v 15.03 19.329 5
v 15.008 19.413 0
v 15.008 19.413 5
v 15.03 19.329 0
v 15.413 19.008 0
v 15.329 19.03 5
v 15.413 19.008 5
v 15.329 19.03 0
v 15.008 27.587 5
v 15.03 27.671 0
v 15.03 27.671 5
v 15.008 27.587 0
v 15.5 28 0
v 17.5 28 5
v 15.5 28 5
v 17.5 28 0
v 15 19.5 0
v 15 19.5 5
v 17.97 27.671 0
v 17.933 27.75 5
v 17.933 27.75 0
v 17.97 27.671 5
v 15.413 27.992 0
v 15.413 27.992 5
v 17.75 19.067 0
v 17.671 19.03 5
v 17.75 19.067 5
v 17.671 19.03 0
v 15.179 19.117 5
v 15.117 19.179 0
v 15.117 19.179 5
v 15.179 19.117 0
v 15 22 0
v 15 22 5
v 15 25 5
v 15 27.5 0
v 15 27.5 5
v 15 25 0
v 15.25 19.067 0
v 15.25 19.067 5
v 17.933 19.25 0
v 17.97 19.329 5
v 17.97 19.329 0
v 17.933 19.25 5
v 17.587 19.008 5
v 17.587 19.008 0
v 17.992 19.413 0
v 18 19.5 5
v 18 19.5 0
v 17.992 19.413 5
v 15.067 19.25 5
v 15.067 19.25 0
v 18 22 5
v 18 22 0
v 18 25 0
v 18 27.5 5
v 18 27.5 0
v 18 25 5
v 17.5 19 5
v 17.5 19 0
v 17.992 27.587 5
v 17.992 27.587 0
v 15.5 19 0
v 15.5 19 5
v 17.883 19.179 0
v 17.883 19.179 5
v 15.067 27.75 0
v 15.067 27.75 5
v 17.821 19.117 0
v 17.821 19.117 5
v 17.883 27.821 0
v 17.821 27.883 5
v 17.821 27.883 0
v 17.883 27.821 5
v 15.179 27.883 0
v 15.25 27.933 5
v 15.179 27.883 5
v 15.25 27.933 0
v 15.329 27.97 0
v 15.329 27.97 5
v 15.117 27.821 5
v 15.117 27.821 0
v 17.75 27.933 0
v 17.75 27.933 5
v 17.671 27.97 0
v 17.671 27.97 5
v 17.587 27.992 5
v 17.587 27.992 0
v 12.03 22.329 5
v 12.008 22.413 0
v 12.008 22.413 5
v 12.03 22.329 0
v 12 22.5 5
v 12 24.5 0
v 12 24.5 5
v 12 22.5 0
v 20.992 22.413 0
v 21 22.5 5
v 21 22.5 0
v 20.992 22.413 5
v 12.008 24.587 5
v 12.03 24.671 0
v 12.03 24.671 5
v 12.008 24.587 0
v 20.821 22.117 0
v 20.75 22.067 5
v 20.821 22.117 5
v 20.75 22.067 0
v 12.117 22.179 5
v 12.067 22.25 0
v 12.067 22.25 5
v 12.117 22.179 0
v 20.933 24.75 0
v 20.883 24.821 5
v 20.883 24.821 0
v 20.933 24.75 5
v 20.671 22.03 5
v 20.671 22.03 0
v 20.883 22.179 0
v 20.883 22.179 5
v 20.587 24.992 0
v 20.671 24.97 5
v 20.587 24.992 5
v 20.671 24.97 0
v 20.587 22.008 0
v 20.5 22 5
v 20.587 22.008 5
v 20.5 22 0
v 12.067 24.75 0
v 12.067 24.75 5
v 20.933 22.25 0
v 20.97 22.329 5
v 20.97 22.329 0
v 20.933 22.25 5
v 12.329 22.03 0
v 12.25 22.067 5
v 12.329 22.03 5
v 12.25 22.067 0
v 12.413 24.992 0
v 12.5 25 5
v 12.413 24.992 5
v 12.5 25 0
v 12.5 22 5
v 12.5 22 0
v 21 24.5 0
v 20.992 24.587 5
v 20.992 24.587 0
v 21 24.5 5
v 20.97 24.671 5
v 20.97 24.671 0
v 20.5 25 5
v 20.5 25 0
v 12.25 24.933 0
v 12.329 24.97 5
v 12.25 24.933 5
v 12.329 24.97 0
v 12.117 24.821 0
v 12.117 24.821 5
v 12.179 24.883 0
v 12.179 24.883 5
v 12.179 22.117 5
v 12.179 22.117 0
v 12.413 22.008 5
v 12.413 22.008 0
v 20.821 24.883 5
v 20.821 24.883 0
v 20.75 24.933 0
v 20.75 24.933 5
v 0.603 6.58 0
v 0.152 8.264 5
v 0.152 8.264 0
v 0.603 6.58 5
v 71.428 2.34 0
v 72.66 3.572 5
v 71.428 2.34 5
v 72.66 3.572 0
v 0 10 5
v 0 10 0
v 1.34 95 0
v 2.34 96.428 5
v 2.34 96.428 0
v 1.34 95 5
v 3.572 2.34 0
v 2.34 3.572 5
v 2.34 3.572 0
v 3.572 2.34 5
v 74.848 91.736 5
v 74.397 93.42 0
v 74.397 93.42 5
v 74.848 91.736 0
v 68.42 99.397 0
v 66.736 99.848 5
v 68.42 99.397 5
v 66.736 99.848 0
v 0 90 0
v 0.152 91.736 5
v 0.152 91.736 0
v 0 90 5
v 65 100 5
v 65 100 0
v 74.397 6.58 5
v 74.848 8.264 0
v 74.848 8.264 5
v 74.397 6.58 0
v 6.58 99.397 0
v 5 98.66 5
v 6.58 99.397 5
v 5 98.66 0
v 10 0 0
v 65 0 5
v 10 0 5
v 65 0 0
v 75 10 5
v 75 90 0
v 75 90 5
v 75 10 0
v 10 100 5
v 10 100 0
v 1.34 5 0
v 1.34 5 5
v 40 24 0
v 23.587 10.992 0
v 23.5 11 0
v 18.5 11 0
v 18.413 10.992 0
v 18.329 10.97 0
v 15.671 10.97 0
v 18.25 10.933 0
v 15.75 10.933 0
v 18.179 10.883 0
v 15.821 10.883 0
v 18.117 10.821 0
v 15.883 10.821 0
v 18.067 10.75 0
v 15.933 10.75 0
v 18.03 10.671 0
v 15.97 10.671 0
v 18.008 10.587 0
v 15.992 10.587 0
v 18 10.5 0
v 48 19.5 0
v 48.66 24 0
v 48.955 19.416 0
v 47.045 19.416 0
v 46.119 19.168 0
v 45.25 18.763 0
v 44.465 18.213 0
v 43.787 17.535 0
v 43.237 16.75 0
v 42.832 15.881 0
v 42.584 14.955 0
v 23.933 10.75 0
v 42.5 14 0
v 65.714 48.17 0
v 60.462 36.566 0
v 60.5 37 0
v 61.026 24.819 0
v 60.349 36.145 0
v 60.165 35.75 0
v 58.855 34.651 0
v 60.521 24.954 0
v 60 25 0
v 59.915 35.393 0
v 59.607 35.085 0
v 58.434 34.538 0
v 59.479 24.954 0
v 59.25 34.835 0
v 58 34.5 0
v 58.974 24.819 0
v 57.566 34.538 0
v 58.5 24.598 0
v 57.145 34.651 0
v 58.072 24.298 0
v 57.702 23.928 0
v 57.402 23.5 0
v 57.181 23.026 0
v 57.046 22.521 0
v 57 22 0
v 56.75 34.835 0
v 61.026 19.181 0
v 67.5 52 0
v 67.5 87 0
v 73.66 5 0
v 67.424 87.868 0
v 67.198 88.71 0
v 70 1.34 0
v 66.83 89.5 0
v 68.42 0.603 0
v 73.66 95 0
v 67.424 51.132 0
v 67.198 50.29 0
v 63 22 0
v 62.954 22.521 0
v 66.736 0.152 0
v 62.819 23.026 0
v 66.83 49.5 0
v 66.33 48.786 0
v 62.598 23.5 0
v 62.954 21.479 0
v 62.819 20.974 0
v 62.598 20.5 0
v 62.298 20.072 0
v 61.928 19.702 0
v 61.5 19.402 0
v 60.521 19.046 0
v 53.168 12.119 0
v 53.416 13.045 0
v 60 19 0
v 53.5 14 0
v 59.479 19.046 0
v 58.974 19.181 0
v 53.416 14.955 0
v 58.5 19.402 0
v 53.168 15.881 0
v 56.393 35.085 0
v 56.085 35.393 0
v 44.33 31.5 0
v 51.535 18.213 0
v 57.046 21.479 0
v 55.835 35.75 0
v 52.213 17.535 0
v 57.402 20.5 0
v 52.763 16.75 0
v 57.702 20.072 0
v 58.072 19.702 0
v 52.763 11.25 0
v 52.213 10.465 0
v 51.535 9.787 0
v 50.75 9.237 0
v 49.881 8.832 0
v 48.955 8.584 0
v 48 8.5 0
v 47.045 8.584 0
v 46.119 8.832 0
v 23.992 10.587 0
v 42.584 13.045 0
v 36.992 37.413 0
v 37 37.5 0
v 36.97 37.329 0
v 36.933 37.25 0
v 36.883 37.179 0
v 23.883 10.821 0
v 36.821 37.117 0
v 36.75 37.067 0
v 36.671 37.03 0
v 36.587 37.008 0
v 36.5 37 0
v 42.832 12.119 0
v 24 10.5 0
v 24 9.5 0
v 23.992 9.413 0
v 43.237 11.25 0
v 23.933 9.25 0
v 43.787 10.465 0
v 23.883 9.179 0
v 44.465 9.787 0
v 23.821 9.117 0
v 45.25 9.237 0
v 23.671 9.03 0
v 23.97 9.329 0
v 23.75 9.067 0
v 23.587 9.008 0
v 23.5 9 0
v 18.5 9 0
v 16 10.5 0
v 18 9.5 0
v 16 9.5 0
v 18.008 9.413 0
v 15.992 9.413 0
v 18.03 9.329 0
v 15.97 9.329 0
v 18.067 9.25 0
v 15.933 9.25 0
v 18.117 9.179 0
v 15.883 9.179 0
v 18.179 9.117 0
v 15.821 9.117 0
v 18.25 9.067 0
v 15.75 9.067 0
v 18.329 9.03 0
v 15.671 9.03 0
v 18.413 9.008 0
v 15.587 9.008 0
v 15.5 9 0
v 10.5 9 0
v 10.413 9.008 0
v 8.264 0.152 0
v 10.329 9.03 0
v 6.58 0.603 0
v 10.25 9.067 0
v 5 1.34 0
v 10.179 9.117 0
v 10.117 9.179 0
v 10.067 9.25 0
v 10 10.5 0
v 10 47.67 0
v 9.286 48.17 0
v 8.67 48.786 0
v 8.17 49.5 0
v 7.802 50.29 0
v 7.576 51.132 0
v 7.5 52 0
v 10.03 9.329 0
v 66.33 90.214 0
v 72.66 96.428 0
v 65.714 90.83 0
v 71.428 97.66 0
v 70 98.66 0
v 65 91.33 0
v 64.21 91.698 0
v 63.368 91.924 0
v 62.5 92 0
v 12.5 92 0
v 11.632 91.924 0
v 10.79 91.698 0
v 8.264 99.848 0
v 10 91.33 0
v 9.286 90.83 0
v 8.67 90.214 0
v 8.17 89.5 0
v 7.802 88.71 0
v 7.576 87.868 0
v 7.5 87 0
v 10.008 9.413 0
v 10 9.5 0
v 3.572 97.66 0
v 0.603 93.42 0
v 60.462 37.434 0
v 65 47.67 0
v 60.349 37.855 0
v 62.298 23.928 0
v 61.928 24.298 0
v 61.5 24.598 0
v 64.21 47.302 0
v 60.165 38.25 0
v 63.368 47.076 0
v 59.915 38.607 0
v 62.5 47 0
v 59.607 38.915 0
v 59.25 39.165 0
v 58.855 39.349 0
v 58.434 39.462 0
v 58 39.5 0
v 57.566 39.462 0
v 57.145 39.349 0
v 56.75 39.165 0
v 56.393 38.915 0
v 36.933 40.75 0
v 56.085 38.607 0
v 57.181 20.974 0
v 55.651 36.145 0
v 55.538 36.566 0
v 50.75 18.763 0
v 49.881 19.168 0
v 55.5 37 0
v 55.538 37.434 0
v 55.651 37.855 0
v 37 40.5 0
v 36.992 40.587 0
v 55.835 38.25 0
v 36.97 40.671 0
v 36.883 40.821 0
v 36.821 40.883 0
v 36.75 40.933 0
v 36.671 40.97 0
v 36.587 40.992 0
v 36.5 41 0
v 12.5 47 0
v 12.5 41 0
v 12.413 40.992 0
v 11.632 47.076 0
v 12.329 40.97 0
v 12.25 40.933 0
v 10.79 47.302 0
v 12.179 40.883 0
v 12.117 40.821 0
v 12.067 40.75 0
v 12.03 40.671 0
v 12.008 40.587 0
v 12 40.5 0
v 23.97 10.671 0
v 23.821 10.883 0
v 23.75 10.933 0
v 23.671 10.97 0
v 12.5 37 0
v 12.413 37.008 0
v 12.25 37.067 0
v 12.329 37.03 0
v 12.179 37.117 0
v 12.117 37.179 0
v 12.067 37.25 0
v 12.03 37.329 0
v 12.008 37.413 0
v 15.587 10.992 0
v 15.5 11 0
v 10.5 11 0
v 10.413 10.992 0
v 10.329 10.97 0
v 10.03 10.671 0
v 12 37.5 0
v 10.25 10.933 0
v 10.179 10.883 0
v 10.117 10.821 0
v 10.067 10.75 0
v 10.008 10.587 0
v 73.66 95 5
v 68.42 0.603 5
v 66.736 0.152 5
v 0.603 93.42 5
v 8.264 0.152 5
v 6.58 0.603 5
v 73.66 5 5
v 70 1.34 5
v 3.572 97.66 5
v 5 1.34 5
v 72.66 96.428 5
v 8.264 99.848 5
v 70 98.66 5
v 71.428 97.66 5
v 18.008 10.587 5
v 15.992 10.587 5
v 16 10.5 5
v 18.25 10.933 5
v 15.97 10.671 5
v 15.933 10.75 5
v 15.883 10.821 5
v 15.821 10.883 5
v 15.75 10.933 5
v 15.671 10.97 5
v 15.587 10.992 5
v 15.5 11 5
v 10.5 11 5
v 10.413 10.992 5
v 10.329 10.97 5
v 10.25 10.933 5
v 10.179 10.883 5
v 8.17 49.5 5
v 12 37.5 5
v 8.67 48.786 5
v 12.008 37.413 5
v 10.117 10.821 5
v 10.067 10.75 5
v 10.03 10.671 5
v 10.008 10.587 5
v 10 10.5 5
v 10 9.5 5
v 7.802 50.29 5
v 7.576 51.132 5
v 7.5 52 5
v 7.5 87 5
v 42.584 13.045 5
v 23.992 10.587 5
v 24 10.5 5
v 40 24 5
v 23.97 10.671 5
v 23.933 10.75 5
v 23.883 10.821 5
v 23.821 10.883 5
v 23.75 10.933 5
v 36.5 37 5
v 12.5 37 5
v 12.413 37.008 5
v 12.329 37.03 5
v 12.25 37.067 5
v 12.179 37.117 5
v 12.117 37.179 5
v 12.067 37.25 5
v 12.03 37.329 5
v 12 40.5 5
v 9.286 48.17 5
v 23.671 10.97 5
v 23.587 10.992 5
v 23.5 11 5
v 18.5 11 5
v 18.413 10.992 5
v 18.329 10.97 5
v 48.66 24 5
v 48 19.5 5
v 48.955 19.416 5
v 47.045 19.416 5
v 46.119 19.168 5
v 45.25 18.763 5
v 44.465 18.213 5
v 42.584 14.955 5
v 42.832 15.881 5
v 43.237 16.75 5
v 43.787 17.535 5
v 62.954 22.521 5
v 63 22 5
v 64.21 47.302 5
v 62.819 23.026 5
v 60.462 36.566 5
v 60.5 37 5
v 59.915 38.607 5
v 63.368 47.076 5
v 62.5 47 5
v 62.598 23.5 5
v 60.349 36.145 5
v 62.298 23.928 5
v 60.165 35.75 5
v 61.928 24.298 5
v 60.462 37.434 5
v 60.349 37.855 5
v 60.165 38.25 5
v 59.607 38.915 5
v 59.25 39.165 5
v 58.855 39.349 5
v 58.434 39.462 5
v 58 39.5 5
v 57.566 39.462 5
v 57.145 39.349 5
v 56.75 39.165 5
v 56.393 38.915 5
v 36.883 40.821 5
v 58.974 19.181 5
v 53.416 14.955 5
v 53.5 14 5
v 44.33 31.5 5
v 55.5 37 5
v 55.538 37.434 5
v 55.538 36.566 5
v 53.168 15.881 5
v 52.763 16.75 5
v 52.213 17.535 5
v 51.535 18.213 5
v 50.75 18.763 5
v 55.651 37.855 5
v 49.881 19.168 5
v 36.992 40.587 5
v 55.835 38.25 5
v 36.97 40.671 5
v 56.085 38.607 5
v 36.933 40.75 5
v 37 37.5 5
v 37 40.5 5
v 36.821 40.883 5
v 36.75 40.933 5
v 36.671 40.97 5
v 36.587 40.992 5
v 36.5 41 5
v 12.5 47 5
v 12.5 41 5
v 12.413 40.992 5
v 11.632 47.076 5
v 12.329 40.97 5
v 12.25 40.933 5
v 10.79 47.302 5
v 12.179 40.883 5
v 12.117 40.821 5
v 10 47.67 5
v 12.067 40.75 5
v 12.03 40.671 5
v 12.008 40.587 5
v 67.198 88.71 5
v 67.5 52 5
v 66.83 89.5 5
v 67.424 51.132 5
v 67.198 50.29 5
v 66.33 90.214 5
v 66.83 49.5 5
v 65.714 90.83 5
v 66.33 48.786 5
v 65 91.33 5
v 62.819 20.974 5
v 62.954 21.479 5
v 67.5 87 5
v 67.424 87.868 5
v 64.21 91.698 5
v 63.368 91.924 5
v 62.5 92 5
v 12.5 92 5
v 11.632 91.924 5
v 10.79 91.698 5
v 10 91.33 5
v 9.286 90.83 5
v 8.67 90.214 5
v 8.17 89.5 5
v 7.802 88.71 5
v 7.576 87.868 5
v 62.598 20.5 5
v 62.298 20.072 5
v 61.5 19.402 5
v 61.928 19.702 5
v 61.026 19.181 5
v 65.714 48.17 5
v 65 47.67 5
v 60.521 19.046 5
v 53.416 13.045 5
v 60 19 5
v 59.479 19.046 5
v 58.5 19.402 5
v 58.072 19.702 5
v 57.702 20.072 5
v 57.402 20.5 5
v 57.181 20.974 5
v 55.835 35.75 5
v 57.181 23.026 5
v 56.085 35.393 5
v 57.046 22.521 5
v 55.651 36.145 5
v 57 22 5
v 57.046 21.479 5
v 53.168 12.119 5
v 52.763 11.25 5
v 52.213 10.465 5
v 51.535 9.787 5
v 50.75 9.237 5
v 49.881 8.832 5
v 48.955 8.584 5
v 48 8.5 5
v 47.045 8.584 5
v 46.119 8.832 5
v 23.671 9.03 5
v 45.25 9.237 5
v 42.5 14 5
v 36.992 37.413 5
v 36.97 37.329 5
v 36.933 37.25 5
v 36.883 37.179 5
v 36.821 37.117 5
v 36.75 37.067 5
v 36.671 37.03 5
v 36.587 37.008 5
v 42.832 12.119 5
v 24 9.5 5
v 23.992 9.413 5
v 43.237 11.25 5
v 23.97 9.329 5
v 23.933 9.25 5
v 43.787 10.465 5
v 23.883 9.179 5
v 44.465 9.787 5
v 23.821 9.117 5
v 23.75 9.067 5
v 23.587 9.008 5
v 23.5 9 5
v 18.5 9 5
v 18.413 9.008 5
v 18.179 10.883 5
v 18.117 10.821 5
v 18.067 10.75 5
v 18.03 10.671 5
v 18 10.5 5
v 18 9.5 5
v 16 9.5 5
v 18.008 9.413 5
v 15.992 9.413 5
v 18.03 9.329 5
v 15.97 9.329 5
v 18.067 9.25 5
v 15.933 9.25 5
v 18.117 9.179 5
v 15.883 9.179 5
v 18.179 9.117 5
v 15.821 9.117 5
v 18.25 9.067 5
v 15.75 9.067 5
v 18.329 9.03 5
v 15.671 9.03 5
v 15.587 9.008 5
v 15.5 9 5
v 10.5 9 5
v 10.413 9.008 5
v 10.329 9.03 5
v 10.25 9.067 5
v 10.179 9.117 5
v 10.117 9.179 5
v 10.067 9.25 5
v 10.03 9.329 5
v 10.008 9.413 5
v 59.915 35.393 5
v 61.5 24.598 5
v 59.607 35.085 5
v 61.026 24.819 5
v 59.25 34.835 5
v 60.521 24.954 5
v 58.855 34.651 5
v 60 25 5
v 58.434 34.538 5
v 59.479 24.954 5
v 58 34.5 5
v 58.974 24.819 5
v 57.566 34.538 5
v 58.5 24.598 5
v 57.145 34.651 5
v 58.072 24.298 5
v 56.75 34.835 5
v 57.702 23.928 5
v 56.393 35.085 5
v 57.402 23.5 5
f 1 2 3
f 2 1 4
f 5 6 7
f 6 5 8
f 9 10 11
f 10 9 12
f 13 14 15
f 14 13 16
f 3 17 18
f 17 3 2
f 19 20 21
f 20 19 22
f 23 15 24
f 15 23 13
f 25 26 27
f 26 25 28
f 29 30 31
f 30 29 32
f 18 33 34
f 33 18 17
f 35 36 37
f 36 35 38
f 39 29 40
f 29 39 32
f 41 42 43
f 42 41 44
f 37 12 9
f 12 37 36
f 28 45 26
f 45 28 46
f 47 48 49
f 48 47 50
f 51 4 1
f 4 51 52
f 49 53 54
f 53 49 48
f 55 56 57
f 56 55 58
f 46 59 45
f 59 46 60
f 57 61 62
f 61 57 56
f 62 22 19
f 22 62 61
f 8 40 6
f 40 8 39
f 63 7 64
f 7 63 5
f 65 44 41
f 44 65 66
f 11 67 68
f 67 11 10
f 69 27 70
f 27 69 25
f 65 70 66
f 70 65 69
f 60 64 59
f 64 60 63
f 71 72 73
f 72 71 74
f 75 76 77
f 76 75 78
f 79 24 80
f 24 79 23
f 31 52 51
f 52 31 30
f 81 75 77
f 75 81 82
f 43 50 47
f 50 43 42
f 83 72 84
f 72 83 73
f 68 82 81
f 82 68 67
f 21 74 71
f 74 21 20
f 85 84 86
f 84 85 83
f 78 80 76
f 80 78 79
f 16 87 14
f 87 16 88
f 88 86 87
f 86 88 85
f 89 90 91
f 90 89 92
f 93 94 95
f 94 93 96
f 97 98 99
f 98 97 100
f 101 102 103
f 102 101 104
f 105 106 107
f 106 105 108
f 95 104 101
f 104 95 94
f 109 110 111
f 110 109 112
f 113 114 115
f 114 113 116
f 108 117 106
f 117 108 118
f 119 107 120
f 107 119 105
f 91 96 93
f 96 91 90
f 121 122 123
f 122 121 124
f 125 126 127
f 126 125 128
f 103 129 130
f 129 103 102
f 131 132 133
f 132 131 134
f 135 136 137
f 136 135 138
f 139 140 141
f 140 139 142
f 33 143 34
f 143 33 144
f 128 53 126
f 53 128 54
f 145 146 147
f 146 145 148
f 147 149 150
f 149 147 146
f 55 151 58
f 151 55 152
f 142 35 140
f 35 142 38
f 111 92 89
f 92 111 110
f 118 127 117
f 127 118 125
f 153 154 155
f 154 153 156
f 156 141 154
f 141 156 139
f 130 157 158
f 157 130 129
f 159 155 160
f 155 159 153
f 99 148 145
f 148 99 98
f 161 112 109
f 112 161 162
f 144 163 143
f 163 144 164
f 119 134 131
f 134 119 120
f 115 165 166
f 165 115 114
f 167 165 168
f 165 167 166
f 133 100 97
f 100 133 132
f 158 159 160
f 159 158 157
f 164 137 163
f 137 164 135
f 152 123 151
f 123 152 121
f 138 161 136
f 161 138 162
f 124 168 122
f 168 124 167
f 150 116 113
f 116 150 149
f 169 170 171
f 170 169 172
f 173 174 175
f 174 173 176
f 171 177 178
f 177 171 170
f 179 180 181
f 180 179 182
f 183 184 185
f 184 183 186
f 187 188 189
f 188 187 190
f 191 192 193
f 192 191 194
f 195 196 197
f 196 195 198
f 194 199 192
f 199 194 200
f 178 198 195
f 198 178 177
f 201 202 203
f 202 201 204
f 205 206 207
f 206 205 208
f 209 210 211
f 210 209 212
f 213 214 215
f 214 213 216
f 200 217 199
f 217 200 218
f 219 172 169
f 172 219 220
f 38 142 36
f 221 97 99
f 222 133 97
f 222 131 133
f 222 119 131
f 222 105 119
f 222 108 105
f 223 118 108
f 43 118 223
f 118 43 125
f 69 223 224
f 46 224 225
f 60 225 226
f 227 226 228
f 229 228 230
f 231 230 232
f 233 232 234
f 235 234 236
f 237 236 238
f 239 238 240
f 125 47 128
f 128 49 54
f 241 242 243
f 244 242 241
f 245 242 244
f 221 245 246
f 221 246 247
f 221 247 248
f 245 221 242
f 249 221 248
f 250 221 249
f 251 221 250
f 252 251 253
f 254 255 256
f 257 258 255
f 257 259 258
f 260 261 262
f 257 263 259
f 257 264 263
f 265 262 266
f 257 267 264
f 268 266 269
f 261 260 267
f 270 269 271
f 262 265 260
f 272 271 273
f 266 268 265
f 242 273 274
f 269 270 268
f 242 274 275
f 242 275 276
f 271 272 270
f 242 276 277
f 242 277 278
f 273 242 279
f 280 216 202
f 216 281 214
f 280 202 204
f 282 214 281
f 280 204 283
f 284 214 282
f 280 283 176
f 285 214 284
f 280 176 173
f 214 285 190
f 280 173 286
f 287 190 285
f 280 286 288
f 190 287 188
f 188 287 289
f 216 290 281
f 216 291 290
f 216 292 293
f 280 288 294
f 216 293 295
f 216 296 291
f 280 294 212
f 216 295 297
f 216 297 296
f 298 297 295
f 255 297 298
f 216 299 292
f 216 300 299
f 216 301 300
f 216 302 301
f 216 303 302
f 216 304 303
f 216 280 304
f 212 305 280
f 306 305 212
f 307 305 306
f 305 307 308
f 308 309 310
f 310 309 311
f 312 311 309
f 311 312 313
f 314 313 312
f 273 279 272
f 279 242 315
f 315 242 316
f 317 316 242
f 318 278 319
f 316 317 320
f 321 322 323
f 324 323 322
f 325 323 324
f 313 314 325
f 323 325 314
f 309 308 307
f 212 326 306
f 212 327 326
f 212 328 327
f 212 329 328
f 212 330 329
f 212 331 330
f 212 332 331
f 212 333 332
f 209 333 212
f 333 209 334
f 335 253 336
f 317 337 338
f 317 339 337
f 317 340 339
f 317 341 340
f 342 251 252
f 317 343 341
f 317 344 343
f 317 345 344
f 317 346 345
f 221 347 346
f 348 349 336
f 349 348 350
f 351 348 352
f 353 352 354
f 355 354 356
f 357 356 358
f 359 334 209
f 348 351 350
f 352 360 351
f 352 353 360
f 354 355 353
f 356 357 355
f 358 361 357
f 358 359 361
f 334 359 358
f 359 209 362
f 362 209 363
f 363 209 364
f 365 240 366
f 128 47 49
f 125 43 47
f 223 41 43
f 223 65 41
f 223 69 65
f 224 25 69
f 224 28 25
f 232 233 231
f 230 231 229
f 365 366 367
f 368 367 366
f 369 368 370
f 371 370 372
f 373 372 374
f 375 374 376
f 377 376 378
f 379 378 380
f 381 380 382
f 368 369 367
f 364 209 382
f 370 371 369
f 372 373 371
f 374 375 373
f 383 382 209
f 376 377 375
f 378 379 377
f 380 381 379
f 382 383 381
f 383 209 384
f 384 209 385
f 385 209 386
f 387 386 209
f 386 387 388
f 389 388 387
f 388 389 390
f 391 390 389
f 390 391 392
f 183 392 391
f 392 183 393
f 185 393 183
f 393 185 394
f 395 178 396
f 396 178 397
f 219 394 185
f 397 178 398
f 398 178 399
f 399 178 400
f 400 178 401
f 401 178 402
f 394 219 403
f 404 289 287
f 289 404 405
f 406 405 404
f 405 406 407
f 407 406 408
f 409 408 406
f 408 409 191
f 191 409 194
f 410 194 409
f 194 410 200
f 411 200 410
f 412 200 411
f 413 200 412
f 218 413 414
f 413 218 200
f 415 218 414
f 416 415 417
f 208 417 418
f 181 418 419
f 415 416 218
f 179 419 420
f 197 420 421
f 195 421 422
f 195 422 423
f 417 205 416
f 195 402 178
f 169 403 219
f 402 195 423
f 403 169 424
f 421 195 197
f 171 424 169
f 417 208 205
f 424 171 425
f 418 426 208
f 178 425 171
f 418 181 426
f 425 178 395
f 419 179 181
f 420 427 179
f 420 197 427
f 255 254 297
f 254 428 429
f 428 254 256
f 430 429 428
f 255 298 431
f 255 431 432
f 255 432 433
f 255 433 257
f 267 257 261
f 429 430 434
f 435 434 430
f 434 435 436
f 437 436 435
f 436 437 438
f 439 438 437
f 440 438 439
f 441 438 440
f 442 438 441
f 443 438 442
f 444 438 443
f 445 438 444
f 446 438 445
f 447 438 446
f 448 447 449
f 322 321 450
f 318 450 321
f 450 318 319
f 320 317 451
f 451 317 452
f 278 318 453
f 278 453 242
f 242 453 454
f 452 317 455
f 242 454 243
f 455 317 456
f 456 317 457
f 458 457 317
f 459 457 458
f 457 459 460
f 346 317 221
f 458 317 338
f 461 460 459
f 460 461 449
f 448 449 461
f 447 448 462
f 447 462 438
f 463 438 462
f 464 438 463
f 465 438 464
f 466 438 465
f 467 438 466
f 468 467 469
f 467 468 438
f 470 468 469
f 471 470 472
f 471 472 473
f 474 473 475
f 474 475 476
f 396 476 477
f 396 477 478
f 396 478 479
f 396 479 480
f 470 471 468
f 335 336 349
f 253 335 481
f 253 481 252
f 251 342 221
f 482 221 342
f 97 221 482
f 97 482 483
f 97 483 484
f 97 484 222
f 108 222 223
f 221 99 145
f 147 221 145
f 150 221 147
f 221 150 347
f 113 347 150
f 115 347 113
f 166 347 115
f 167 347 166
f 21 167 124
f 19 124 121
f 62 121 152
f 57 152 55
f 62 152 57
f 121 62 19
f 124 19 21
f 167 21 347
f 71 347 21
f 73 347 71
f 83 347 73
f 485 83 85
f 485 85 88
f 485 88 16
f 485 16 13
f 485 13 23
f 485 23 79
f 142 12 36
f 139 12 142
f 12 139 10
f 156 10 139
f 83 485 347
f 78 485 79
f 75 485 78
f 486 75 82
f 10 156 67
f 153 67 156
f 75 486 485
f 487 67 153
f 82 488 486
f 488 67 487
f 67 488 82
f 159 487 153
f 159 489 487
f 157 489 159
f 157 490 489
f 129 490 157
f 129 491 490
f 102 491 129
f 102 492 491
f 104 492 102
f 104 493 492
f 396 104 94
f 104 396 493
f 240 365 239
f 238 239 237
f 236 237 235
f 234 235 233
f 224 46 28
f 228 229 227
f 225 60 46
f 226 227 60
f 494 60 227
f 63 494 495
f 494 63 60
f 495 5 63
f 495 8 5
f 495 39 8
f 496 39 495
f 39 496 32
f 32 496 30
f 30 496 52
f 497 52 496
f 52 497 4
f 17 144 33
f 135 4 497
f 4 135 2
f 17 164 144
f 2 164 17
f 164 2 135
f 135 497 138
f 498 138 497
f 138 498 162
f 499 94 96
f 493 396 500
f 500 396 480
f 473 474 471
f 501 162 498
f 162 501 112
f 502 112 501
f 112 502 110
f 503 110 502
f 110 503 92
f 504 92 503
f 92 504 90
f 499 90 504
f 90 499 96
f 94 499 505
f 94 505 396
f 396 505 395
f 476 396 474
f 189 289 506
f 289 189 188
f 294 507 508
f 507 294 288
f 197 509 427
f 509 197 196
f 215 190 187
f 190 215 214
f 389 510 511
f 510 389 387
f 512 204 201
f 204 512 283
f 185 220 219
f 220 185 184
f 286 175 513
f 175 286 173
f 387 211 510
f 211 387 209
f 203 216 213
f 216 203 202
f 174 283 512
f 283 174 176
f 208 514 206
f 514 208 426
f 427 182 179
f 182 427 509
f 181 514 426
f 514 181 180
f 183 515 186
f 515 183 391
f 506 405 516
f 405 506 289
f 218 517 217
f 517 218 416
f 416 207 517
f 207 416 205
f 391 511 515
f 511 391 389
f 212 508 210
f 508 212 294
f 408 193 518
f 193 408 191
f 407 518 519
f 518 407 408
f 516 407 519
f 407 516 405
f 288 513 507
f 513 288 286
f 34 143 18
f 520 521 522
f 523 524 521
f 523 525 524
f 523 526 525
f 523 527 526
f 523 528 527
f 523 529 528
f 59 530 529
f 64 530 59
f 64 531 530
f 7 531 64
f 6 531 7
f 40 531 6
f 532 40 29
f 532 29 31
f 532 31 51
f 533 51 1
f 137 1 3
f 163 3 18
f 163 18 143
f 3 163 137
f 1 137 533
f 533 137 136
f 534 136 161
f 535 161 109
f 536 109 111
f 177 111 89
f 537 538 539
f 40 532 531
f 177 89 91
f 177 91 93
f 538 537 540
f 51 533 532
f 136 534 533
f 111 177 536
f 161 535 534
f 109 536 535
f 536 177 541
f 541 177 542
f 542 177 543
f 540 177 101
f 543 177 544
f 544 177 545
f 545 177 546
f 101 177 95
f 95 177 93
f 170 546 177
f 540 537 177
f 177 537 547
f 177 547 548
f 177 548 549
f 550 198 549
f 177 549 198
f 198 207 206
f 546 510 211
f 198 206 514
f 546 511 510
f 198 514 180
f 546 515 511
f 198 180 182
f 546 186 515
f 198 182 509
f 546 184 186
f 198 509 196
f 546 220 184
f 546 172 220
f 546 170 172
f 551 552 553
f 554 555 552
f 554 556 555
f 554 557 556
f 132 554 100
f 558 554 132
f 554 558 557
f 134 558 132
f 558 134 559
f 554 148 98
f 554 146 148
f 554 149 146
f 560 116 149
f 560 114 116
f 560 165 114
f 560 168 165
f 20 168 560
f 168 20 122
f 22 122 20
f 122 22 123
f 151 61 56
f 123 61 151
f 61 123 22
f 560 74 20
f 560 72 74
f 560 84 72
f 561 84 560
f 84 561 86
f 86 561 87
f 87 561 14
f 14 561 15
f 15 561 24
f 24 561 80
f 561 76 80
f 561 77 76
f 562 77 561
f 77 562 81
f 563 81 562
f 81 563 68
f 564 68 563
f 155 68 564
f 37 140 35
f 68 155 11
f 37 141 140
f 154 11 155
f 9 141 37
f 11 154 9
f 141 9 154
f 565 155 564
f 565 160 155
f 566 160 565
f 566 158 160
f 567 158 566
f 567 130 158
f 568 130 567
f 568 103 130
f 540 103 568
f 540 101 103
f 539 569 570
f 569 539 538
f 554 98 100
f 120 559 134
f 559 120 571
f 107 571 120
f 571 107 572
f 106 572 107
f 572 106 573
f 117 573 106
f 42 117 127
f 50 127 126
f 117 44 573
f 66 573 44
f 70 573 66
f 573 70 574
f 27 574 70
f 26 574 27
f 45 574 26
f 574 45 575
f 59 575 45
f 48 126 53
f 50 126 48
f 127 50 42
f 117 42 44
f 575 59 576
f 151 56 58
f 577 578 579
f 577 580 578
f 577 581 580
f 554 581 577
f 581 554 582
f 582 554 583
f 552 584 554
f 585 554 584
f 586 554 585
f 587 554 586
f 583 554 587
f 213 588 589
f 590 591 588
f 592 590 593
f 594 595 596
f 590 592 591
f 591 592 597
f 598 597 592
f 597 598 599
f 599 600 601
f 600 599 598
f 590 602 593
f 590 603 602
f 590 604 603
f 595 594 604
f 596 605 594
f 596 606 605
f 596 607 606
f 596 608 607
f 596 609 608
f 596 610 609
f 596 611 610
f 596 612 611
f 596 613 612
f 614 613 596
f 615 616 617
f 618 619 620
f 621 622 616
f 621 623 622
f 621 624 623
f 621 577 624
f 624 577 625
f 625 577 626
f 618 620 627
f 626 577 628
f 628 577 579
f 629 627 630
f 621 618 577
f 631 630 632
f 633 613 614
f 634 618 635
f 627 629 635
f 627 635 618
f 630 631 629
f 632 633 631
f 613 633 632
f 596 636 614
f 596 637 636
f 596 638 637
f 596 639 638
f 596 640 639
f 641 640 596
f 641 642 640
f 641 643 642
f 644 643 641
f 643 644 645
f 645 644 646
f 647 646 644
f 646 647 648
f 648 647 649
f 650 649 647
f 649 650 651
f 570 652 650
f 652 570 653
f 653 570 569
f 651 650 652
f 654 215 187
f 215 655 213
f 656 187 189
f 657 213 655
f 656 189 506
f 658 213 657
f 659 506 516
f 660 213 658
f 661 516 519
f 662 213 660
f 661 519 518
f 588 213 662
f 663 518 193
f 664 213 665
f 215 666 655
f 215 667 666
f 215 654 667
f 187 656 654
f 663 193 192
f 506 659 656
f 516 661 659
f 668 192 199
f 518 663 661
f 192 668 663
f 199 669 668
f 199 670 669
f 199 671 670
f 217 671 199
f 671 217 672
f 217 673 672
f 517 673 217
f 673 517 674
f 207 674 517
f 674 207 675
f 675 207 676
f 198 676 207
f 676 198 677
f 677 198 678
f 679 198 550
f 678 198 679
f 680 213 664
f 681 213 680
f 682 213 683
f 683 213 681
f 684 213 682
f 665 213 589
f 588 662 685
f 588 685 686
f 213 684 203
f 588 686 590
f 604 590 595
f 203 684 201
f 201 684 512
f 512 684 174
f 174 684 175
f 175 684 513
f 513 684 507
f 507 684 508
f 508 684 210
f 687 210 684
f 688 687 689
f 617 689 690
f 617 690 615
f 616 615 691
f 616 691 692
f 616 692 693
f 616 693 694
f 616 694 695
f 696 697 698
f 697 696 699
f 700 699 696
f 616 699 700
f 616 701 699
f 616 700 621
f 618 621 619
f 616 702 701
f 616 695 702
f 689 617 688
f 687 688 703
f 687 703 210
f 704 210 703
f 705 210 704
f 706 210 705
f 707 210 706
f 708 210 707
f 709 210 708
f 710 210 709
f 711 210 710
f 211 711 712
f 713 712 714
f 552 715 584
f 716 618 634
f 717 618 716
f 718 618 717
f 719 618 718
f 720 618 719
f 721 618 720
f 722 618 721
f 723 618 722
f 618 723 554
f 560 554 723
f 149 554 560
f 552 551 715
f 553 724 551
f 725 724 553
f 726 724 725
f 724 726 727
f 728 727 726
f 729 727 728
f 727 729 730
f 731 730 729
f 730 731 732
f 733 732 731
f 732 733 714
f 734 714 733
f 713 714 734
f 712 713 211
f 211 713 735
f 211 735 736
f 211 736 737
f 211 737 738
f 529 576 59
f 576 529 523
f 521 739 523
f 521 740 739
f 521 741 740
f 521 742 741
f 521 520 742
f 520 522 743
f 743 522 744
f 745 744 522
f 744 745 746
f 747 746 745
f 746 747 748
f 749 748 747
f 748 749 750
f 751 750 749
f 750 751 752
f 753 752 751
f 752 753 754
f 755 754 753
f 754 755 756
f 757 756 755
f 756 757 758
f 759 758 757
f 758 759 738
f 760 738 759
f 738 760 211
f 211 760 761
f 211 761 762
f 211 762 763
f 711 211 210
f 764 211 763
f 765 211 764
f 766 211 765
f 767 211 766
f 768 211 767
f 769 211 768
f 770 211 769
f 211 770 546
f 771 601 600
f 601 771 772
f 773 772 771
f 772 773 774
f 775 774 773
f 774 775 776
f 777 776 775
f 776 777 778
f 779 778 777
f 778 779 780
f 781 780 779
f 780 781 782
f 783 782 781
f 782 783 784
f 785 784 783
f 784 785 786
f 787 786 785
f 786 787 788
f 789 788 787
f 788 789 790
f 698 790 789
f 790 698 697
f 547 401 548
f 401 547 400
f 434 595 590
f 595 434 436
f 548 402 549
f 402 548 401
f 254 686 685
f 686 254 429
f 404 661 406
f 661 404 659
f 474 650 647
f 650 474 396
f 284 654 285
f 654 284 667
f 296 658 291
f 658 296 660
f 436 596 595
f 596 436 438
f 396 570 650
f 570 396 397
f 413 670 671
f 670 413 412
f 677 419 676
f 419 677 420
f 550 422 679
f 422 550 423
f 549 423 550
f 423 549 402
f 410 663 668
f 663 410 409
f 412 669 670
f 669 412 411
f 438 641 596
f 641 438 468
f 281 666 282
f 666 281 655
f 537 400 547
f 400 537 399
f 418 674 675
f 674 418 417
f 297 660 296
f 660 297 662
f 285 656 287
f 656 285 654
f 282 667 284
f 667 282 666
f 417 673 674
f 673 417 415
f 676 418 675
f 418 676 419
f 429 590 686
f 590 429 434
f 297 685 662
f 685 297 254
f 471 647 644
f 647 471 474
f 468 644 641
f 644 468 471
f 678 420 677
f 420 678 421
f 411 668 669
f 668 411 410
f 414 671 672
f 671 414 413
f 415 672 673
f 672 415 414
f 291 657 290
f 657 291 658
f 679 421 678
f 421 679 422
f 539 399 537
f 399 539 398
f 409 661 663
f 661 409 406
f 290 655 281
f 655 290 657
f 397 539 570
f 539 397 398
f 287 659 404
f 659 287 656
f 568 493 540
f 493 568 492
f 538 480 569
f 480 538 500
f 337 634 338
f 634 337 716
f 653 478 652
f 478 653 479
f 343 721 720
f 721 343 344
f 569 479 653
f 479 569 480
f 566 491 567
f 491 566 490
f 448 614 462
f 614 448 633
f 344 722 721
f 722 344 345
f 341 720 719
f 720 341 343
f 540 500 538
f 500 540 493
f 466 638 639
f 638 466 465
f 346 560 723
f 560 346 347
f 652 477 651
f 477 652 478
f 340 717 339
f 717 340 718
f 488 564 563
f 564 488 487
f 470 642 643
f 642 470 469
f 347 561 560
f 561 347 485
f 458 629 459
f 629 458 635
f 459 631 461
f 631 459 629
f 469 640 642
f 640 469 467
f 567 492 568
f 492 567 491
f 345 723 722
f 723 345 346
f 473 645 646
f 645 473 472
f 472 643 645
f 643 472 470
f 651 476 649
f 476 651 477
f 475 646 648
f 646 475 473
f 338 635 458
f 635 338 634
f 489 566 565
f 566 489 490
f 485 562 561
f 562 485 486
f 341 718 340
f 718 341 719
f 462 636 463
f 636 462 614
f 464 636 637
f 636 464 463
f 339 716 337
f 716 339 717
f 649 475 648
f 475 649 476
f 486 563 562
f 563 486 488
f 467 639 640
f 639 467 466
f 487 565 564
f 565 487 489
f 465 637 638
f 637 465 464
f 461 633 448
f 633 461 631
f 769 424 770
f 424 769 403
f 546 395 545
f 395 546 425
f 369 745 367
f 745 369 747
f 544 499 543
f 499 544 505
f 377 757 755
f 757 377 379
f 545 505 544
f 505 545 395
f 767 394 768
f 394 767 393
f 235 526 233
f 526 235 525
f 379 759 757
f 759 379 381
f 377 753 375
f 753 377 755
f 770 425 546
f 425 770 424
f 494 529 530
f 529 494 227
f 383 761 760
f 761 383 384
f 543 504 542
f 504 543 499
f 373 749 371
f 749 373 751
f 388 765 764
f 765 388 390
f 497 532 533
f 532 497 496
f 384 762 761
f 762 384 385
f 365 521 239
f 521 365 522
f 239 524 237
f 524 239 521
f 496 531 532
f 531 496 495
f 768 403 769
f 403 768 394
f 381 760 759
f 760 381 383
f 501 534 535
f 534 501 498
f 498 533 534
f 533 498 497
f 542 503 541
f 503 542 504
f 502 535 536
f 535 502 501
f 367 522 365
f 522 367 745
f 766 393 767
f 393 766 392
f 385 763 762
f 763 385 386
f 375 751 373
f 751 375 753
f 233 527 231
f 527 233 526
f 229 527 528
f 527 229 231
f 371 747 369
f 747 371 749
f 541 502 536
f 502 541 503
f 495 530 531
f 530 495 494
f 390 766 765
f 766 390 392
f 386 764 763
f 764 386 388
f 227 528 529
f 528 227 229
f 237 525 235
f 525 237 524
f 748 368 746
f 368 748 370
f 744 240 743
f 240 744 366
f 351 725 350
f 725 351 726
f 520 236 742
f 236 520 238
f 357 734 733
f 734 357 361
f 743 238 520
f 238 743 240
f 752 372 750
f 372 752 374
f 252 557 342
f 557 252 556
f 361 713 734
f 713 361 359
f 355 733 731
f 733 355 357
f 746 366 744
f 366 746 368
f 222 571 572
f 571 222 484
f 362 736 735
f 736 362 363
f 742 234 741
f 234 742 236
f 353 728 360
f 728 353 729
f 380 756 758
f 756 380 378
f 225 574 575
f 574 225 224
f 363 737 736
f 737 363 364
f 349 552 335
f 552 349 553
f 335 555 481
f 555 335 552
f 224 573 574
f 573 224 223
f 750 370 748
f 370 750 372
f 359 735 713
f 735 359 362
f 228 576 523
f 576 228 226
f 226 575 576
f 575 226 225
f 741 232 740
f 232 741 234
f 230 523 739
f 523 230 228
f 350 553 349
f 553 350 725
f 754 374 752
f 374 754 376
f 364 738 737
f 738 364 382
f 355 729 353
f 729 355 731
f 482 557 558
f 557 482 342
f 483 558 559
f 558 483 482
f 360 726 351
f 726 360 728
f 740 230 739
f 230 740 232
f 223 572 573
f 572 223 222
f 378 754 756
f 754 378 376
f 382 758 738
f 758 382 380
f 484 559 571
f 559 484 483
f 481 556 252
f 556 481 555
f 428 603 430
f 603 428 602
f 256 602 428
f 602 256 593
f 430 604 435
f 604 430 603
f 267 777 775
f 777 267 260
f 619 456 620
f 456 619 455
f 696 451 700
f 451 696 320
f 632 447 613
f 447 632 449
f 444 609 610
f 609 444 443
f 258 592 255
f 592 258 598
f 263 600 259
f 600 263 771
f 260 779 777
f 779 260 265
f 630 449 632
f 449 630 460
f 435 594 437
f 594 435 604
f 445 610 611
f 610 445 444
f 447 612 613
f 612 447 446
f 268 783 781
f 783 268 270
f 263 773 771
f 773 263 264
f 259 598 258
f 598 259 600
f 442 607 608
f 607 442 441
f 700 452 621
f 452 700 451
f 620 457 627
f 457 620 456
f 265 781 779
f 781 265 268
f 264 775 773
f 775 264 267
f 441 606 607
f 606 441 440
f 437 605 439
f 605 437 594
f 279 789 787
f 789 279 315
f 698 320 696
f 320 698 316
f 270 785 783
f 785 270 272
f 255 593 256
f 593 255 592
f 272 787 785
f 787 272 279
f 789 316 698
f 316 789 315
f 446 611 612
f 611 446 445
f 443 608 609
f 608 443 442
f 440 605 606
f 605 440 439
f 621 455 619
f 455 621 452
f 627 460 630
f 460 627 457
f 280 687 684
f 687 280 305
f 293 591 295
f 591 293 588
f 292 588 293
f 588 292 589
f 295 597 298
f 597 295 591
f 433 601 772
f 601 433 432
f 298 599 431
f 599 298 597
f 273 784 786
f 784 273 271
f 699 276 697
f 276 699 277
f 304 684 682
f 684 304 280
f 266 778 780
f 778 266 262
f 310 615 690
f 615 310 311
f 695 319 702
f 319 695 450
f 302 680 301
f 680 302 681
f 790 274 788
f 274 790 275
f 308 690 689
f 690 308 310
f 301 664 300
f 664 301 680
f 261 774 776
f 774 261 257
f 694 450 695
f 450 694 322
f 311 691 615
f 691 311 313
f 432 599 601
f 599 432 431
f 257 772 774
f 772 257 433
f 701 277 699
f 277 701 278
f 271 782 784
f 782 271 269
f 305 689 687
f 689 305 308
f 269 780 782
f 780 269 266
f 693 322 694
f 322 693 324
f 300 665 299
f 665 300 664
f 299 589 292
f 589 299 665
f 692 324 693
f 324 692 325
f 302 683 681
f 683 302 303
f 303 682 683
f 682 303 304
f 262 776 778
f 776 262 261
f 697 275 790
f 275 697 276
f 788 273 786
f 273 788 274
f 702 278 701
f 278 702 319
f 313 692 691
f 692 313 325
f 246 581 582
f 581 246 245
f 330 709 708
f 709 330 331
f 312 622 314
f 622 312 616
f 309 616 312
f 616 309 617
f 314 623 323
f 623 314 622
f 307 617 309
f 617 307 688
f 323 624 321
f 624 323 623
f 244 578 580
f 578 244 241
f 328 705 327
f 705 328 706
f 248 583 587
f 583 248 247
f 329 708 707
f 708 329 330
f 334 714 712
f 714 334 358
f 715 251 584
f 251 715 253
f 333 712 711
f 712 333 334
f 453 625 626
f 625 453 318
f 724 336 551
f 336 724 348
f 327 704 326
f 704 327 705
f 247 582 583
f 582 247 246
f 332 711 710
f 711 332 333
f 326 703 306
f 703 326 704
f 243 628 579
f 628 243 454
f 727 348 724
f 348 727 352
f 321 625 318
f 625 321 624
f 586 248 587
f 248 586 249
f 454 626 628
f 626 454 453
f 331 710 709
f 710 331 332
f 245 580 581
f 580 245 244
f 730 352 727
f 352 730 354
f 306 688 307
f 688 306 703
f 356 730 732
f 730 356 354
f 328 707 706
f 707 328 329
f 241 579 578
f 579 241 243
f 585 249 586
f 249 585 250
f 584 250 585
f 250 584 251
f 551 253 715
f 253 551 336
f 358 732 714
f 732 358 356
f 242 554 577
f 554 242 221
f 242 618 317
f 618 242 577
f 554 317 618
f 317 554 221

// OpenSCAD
/*
ArduBMO / Front
Version: 0.01
TODO:
*/

$fn=36;

outerX = 75;
outerY = 100;
outerZ = 5;
outerR = 10;
wall = 5;

/* MODULES */

module roundedBox(x,y,z,r)
{
	translate([r,r,0])
	{
		linear_extrude(height=z)
		{
			hull()
			{
				circle(r);
				translate([x-(2*r), 0, 0]) circle(r);
				translate([0, y-(2*r), 0]) circle(r);
				translate([x-(2*r), y-(2*r), 0]) circle(r);
			}
		}
	}
}

module screenHole()
{
	roundedBox(60,45,outerZ+2,outerR/2);
}

module frontSlotHole()
{
	roundedBox(25,4,outerZ+2,0.5);
}

module arrowKeyHole()
{
	union()
	{
		translate([3,0,0]) roundedBox(3, 9 ,outerZ+2, 0.5);
		translate([0,3,0]) roundedBox(9, 3, outerZ+2, 0.5);
	}
}

module controllerHole()
{
	roundedBox(6, 2, outerZ+2, 0.5);
}

module topBlueButtonHole()
{
	cylinder(outerZ+2, 2.5, 2.5);
}

module middleGreenButtonHole()
{
	cylinder(outerZ+2, 3, 3);
}

module bottomRedButtonHole()
{
	cylinder(outerZ+2, 5.5, 5.5);
}

module triangleCyanHole()
{
	radius=5;
	o=radius/2;                
	a=radius*sqrt(3)/2; 
	
	linear_extrude(height=outerZ+2)
	{
	translate([a, radius/2, 0]) polygon(points=[[-a,-o],[0,radius],[a,-o]],paths=[[0,1,2]]);
	}
}

/* CASE FRONT */

difference()
{
	/* solid block */
	roundedBox(outerX,outerY,outerZ,outerR);
	
	/* remove screenHole */
	translate([7.5, outerY-53, -1]) screenHole();

	/* remove frontSlotHole */
	translate([12,37,-1]) frontSlotHole();
	
	/* remove arrowKeyHole */
	translate([12,19,-1]) arrowKeyHole();	

	/* remove controllerHole (A and B) */
	translate([10, 9, -1]) controllerHole();
	translate([18, 9, -1]) controllerHole();
	
	/* remove front right button holes */
	translate([58, 37, -1]) topBlueButtonHole();
	translate([60, 22, -1]) middleGreenButtonHole();
	translate([48, 14, -1]) bottomRedButtonHole();
	translate([40,24,-1]) triangleCyanHole();

}
